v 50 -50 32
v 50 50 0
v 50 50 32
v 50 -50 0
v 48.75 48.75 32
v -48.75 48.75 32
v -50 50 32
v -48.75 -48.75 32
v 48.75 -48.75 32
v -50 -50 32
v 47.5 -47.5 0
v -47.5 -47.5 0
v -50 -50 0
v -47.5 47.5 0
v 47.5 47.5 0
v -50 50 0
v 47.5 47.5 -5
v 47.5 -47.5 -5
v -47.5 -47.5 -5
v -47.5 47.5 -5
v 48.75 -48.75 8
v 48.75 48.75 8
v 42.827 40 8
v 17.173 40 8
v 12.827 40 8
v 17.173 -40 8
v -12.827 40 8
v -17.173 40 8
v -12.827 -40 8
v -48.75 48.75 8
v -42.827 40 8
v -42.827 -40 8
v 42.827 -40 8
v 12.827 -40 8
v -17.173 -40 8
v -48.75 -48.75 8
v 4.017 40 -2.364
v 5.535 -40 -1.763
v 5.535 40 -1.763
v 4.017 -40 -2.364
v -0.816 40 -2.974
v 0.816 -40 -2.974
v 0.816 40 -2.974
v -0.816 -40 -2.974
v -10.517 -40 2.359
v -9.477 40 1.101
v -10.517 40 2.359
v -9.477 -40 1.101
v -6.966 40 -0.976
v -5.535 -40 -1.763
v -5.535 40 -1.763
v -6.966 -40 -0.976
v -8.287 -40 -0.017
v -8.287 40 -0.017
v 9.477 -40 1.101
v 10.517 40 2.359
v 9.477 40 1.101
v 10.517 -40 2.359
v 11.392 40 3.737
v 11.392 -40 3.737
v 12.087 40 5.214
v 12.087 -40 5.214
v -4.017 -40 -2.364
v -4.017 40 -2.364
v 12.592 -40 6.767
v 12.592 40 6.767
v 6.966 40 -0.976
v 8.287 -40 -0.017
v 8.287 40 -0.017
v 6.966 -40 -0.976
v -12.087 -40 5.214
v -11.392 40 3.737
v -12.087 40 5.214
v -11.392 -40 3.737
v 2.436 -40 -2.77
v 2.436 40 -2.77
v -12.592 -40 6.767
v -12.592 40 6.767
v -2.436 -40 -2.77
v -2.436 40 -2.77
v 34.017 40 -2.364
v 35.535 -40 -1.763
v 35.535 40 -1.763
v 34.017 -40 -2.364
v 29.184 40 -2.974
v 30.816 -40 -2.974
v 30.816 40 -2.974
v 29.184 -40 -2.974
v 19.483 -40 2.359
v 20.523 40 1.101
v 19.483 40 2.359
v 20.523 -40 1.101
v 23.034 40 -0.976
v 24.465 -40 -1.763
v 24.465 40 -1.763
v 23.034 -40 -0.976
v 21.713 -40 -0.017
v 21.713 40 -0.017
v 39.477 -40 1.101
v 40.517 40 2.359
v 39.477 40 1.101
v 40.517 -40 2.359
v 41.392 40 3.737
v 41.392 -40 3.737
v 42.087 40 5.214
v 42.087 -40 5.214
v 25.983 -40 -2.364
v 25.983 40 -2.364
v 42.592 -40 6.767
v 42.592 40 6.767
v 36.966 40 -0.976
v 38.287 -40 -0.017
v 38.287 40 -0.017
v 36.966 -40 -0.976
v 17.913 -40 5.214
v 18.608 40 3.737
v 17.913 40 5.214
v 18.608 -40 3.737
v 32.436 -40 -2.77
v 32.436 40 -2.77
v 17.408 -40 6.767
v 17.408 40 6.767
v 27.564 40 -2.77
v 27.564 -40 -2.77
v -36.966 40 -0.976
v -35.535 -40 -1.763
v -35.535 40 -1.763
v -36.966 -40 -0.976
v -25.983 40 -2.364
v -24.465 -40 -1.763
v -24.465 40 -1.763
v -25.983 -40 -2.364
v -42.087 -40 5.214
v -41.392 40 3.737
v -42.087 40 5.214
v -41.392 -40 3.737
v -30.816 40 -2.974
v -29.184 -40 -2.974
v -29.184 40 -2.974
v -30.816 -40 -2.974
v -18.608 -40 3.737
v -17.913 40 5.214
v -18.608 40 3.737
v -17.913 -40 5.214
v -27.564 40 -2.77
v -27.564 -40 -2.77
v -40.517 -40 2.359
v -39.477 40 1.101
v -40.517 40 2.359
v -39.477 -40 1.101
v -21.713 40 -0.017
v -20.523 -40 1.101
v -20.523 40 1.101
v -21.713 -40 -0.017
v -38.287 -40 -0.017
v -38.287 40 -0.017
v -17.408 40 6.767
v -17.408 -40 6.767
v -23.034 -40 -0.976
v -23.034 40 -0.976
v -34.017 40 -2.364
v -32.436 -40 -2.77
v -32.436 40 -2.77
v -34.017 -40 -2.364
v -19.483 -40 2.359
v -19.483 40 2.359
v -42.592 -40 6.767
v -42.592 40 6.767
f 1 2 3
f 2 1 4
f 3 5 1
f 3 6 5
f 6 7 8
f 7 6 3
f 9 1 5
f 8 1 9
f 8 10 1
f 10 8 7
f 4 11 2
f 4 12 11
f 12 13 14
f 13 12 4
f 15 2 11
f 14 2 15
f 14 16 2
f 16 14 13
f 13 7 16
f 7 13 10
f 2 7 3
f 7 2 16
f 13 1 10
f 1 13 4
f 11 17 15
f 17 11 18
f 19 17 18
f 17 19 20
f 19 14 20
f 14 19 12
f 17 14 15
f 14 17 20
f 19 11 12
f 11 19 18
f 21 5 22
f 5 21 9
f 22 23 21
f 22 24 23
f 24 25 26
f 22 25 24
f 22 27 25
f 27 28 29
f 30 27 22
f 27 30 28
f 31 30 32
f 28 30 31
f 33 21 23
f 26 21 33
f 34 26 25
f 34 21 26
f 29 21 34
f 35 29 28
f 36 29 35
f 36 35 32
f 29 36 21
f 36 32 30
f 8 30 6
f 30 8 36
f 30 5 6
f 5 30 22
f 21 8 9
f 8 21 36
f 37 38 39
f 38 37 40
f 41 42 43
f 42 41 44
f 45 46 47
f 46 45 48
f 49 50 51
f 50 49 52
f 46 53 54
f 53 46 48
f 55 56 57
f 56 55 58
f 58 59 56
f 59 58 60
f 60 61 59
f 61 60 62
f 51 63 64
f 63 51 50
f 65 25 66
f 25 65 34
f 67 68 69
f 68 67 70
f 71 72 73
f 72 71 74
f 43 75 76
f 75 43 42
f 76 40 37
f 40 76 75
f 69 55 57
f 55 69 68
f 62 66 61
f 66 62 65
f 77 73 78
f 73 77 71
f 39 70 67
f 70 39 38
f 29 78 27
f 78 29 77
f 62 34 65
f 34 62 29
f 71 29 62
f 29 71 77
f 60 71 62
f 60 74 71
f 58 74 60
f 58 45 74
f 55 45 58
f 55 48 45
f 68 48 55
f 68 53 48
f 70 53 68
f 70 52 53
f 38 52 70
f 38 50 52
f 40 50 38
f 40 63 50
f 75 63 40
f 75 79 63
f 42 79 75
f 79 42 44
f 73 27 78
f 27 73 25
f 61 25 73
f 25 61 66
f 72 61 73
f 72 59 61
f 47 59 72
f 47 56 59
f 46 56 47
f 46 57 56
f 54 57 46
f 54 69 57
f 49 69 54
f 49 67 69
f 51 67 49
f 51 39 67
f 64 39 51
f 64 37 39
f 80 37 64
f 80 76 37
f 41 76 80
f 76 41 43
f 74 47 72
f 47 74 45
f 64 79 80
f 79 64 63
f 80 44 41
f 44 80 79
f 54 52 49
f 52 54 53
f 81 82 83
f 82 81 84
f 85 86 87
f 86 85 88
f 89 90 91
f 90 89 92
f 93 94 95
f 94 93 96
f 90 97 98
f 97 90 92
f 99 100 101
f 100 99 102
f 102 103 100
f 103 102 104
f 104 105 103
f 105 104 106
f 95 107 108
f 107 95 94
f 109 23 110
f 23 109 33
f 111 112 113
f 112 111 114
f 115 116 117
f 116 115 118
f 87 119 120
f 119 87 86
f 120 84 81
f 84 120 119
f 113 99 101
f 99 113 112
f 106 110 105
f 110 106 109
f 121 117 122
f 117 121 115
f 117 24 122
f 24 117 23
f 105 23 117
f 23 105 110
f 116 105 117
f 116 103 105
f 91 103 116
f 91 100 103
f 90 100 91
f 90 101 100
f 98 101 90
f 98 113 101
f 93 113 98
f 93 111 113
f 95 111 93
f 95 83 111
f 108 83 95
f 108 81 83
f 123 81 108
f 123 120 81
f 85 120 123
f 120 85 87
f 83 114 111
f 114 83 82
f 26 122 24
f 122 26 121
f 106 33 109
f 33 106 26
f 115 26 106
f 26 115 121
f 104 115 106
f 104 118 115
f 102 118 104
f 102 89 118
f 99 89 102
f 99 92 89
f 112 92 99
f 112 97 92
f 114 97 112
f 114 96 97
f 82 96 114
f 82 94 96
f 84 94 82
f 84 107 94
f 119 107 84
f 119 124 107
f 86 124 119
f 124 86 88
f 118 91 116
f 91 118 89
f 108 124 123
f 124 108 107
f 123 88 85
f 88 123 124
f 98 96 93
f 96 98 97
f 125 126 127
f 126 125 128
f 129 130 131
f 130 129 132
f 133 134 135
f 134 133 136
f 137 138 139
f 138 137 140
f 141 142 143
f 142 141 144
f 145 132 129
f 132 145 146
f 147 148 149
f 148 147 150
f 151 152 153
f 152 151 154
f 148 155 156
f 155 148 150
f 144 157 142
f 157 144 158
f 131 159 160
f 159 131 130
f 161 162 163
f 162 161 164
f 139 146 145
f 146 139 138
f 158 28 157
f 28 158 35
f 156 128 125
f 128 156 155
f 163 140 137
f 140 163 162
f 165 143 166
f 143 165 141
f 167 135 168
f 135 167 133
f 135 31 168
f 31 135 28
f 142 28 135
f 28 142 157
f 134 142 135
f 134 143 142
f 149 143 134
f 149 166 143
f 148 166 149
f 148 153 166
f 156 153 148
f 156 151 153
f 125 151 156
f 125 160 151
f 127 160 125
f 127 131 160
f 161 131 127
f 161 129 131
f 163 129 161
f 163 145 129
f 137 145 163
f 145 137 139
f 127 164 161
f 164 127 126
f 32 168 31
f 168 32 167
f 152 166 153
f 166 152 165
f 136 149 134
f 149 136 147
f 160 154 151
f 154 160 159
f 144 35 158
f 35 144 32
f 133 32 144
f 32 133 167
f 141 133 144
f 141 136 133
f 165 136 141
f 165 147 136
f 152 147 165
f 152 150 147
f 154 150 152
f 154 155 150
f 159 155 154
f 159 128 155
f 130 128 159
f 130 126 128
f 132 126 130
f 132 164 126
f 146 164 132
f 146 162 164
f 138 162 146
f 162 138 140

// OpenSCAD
$fn=50;
H=32;
H2=5;
SIDE=100;
D=2;
D2=2.5;

difference() {
    union() {
        translate([0,0,H/2]) cube([SIDE,SIDE,H], center=true ); // Box 100x100x40
        translate([0,0,-H2/2]) cube([SIDE-2*D2,SIDE-2*D2,H2],center=true);
    }
    translate([0,0, H]) cube([SIDE-D2,SIDE-D2,1.5*H],center=true);

    translate([  0,0,10]) rotate([90,0,0]) cylinder(d=26,h=80, center=true);
    translate([ 30,0,10]) rotate([90,0,0]) cylinder(d=26,h=80, center=true);
    translate([-30,0,10]) rotate([90,0,0]) cylinder(d=26,h=80, center=true);
   
//    translate([0,-100,0]) cube([300,200,300],center=true); // Tester
}
